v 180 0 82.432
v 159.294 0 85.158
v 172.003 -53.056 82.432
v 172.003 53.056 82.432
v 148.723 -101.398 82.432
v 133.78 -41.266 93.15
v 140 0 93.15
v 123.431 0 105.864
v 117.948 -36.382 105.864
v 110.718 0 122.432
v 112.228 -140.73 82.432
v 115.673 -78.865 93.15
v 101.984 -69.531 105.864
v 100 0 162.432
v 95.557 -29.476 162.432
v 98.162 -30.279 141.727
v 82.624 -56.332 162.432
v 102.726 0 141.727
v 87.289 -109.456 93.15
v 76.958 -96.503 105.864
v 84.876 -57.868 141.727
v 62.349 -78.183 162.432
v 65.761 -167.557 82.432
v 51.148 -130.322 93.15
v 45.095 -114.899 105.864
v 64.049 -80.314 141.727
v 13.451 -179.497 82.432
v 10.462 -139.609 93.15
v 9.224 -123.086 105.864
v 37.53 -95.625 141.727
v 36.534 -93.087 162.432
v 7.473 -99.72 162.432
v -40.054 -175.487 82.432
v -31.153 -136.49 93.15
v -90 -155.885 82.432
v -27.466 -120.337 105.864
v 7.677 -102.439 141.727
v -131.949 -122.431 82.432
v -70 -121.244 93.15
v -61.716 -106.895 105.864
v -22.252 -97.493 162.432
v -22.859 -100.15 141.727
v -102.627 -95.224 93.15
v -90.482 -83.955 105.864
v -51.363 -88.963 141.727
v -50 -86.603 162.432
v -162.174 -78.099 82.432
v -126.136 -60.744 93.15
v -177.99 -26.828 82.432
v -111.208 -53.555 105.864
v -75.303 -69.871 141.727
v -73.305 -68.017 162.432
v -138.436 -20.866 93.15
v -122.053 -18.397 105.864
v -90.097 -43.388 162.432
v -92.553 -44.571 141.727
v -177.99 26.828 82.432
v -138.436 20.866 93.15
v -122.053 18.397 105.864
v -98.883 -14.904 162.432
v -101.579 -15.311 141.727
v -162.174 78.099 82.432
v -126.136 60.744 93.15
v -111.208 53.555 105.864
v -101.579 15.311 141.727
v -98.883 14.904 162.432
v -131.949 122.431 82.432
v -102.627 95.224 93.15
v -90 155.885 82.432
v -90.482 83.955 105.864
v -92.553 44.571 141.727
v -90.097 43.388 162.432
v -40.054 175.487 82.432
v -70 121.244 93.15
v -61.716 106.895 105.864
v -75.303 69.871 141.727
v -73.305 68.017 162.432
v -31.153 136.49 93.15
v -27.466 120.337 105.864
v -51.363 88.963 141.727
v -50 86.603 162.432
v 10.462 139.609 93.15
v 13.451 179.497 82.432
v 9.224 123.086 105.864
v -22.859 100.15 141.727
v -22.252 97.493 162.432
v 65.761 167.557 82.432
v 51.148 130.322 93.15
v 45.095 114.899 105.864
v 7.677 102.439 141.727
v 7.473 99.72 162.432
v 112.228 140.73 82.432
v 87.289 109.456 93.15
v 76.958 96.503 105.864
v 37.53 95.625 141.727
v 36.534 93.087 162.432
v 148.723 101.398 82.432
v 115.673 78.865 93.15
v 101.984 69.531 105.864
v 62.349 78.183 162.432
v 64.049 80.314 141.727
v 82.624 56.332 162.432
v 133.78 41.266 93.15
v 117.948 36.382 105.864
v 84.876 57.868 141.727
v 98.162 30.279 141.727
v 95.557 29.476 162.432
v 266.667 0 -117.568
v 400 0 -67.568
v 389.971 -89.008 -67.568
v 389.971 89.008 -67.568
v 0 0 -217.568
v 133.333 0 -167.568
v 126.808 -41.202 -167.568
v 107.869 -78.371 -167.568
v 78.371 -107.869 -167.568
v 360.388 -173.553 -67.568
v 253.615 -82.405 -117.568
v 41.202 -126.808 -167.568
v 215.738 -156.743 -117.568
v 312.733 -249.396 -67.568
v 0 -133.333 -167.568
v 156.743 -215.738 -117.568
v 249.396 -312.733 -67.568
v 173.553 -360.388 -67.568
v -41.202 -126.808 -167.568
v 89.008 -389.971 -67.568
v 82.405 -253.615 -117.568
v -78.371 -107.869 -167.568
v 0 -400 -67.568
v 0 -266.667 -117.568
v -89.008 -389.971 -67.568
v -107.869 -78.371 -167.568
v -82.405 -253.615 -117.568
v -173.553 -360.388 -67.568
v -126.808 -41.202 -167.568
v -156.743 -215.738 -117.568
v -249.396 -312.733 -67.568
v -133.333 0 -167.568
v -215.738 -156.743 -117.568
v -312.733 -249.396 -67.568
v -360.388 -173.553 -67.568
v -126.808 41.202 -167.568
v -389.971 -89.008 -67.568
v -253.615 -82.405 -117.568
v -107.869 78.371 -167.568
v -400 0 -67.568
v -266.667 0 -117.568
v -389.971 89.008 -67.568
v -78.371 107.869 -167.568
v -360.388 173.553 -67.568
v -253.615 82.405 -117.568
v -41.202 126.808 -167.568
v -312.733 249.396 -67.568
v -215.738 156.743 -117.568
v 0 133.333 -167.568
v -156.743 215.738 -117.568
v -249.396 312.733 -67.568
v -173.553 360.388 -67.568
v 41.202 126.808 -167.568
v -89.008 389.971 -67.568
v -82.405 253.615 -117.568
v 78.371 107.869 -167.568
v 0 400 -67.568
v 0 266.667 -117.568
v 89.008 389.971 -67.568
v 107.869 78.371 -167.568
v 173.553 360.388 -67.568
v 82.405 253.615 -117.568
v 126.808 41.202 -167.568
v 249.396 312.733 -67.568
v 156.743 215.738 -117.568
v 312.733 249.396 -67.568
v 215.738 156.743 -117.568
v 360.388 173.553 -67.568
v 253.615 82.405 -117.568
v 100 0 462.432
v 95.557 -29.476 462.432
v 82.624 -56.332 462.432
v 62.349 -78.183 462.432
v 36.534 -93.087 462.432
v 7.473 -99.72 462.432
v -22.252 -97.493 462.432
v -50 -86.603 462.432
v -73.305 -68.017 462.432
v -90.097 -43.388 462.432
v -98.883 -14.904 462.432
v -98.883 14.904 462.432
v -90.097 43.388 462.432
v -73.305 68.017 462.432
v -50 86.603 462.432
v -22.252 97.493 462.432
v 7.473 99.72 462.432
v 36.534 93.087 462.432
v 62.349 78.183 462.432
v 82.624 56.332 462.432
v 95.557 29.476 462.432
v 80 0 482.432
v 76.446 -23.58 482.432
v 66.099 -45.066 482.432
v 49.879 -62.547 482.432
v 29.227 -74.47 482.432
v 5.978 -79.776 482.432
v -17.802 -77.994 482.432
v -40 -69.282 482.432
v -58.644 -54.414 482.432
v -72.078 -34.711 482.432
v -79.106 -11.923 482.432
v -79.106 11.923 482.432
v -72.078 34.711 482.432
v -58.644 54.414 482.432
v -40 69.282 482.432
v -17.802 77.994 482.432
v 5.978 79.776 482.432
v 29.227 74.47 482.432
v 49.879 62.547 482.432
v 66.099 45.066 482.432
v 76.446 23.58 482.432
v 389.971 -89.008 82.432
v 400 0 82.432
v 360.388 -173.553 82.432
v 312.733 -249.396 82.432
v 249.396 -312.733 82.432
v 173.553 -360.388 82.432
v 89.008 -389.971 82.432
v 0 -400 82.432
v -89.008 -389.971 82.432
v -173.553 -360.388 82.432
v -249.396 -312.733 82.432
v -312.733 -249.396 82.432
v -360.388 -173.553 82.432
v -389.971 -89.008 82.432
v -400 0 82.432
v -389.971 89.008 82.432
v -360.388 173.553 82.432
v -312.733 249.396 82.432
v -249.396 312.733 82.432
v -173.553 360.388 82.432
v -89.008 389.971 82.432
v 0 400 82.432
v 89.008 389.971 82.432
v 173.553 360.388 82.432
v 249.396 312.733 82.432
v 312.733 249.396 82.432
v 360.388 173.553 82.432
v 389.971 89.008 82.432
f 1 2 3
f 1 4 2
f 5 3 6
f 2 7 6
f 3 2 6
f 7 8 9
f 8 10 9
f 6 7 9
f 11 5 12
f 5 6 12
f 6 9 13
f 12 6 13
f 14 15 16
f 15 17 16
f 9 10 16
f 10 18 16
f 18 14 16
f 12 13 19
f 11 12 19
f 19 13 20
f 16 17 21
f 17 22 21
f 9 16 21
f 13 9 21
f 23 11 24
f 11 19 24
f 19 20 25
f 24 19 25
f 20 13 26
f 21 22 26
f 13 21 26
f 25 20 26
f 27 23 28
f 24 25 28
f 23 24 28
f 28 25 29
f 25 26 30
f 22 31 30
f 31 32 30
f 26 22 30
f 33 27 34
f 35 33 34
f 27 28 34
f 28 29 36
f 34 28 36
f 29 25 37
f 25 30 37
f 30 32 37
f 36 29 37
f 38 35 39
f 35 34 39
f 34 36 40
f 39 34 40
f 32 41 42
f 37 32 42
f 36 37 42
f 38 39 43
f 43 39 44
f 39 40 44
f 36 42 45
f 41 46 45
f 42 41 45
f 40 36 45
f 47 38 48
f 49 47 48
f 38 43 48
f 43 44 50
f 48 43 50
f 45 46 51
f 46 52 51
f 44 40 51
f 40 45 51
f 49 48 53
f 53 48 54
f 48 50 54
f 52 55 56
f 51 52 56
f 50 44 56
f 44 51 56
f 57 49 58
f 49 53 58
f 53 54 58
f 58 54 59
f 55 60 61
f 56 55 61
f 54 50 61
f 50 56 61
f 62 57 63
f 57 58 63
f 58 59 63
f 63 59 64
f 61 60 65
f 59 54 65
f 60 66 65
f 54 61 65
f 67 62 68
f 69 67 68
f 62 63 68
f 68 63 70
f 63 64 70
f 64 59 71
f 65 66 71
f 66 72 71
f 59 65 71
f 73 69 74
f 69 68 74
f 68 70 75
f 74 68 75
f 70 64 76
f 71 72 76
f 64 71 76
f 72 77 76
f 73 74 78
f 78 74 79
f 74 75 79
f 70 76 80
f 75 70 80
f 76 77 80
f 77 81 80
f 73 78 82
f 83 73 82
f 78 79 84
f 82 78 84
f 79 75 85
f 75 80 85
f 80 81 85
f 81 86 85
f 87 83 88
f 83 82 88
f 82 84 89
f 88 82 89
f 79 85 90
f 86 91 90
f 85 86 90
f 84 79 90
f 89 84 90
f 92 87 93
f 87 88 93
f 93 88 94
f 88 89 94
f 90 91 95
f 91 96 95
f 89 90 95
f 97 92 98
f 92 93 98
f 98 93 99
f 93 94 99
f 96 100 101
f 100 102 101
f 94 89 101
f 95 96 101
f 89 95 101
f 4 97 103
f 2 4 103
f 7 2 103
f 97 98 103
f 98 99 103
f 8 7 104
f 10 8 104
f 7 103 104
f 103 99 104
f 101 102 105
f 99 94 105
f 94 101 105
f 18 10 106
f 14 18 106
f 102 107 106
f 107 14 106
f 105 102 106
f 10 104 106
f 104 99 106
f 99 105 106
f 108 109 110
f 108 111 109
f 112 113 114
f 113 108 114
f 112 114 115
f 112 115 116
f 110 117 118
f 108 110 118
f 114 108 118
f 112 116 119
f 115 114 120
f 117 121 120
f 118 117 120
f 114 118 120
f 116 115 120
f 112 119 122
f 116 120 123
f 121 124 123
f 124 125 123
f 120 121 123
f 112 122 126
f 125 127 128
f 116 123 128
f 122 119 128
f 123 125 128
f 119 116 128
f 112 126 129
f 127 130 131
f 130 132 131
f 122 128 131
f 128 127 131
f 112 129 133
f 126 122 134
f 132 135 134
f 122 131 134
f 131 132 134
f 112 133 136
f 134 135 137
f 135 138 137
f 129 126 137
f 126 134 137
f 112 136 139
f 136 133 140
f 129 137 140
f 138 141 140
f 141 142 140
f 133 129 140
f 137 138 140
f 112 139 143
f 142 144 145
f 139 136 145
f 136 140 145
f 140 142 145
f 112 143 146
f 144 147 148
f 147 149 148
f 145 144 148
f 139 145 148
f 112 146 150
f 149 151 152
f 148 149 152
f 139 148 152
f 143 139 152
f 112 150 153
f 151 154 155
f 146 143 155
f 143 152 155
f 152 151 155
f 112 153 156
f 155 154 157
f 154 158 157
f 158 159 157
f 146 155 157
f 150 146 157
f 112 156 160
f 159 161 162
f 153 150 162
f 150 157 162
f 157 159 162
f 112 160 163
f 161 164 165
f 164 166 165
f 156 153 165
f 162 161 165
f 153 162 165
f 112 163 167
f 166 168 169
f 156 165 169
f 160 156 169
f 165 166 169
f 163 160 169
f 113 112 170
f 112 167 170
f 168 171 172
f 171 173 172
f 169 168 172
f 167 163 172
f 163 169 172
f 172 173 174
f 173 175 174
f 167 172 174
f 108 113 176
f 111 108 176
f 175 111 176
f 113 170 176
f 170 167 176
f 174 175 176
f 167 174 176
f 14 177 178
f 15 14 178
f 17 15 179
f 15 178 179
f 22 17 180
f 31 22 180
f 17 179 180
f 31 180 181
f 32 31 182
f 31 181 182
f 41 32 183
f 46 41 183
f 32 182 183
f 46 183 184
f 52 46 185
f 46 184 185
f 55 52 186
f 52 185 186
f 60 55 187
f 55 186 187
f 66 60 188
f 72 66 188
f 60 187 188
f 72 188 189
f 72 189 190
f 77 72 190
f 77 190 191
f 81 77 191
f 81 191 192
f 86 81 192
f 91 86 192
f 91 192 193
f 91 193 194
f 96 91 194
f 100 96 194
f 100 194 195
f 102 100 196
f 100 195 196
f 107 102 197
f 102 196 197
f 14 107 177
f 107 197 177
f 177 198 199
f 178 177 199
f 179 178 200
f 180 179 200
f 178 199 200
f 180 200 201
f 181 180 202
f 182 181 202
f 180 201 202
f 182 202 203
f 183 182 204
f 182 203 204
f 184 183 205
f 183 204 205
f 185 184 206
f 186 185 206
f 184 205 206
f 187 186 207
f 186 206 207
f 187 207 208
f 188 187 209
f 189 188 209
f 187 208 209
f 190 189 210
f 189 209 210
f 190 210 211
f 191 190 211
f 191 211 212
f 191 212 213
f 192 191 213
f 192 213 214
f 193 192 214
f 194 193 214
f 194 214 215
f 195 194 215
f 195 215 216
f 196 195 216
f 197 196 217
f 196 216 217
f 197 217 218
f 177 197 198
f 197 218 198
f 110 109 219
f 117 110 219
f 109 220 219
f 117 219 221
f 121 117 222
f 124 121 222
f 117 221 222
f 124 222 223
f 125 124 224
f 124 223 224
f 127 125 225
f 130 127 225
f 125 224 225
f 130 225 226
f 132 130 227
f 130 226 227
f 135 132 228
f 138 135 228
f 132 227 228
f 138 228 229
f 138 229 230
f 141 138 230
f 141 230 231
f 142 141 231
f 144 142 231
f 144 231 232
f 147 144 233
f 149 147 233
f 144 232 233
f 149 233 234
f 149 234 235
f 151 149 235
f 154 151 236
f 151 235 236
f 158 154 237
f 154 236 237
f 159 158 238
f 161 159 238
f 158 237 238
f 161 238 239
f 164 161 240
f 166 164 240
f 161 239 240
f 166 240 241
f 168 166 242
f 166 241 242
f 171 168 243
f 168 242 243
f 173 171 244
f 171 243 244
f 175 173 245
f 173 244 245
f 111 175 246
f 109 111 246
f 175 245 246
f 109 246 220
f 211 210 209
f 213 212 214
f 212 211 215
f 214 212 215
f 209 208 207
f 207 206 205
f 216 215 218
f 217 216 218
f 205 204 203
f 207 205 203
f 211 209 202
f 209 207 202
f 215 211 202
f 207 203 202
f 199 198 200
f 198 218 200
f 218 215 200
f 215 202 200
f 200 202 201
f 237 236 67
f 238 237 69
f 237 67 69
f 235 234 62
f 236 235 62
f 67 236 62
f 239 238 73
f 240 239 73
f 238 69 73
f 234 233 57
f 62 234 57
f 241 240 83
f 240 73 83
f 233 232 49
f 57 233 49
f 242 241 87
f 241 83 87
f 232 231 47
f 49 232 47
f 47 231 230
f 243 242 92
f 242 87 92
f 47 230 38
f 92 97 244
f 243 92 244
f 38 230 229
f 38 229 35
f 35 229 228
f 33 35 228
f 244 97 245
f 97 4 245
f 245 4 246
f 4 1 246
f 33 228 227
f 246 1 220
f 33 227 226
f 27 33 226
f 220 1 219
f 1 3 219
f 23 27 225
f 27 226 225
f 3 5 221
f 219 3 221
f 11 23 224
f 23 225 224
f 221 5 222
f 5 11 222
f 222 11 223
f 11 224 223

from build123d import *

# Parameters (mm, degrees)
F2_SIZE = 20


with BuildPart() as f1:
    # F0 (on Front) → F1 (revolve)
    with BuildSketch(Plane.XZ):
        with BuildLine():
            Line((100, 162.432451), (100, 482.432451))
            Line((100, 482.432451), (0, 482.432451))
            Line((0, 482.432451), (0, -217.567549))
            Line((0, -217.567549), (400, -67.567549))
            Line((400, -67.567549), (400, 82.432451))
            Line((400, 82.432451), (180, 82.432451))
            ThreePointArc((180, 82.432451), (123.431458, 105.863908), (100, 162.432451))
        make_face()
    revolve(axis=Axis((0, 0, 132.432451), (0, 0, -1)))

    # F2
    f2_edges = [f1.edges().sort_by_distance(p)[0] for p in [
        (-100, 0, 482.432451),
    ]]
    chamfer(f2_edges, length=F2_SIZE)


solid = f1.part
